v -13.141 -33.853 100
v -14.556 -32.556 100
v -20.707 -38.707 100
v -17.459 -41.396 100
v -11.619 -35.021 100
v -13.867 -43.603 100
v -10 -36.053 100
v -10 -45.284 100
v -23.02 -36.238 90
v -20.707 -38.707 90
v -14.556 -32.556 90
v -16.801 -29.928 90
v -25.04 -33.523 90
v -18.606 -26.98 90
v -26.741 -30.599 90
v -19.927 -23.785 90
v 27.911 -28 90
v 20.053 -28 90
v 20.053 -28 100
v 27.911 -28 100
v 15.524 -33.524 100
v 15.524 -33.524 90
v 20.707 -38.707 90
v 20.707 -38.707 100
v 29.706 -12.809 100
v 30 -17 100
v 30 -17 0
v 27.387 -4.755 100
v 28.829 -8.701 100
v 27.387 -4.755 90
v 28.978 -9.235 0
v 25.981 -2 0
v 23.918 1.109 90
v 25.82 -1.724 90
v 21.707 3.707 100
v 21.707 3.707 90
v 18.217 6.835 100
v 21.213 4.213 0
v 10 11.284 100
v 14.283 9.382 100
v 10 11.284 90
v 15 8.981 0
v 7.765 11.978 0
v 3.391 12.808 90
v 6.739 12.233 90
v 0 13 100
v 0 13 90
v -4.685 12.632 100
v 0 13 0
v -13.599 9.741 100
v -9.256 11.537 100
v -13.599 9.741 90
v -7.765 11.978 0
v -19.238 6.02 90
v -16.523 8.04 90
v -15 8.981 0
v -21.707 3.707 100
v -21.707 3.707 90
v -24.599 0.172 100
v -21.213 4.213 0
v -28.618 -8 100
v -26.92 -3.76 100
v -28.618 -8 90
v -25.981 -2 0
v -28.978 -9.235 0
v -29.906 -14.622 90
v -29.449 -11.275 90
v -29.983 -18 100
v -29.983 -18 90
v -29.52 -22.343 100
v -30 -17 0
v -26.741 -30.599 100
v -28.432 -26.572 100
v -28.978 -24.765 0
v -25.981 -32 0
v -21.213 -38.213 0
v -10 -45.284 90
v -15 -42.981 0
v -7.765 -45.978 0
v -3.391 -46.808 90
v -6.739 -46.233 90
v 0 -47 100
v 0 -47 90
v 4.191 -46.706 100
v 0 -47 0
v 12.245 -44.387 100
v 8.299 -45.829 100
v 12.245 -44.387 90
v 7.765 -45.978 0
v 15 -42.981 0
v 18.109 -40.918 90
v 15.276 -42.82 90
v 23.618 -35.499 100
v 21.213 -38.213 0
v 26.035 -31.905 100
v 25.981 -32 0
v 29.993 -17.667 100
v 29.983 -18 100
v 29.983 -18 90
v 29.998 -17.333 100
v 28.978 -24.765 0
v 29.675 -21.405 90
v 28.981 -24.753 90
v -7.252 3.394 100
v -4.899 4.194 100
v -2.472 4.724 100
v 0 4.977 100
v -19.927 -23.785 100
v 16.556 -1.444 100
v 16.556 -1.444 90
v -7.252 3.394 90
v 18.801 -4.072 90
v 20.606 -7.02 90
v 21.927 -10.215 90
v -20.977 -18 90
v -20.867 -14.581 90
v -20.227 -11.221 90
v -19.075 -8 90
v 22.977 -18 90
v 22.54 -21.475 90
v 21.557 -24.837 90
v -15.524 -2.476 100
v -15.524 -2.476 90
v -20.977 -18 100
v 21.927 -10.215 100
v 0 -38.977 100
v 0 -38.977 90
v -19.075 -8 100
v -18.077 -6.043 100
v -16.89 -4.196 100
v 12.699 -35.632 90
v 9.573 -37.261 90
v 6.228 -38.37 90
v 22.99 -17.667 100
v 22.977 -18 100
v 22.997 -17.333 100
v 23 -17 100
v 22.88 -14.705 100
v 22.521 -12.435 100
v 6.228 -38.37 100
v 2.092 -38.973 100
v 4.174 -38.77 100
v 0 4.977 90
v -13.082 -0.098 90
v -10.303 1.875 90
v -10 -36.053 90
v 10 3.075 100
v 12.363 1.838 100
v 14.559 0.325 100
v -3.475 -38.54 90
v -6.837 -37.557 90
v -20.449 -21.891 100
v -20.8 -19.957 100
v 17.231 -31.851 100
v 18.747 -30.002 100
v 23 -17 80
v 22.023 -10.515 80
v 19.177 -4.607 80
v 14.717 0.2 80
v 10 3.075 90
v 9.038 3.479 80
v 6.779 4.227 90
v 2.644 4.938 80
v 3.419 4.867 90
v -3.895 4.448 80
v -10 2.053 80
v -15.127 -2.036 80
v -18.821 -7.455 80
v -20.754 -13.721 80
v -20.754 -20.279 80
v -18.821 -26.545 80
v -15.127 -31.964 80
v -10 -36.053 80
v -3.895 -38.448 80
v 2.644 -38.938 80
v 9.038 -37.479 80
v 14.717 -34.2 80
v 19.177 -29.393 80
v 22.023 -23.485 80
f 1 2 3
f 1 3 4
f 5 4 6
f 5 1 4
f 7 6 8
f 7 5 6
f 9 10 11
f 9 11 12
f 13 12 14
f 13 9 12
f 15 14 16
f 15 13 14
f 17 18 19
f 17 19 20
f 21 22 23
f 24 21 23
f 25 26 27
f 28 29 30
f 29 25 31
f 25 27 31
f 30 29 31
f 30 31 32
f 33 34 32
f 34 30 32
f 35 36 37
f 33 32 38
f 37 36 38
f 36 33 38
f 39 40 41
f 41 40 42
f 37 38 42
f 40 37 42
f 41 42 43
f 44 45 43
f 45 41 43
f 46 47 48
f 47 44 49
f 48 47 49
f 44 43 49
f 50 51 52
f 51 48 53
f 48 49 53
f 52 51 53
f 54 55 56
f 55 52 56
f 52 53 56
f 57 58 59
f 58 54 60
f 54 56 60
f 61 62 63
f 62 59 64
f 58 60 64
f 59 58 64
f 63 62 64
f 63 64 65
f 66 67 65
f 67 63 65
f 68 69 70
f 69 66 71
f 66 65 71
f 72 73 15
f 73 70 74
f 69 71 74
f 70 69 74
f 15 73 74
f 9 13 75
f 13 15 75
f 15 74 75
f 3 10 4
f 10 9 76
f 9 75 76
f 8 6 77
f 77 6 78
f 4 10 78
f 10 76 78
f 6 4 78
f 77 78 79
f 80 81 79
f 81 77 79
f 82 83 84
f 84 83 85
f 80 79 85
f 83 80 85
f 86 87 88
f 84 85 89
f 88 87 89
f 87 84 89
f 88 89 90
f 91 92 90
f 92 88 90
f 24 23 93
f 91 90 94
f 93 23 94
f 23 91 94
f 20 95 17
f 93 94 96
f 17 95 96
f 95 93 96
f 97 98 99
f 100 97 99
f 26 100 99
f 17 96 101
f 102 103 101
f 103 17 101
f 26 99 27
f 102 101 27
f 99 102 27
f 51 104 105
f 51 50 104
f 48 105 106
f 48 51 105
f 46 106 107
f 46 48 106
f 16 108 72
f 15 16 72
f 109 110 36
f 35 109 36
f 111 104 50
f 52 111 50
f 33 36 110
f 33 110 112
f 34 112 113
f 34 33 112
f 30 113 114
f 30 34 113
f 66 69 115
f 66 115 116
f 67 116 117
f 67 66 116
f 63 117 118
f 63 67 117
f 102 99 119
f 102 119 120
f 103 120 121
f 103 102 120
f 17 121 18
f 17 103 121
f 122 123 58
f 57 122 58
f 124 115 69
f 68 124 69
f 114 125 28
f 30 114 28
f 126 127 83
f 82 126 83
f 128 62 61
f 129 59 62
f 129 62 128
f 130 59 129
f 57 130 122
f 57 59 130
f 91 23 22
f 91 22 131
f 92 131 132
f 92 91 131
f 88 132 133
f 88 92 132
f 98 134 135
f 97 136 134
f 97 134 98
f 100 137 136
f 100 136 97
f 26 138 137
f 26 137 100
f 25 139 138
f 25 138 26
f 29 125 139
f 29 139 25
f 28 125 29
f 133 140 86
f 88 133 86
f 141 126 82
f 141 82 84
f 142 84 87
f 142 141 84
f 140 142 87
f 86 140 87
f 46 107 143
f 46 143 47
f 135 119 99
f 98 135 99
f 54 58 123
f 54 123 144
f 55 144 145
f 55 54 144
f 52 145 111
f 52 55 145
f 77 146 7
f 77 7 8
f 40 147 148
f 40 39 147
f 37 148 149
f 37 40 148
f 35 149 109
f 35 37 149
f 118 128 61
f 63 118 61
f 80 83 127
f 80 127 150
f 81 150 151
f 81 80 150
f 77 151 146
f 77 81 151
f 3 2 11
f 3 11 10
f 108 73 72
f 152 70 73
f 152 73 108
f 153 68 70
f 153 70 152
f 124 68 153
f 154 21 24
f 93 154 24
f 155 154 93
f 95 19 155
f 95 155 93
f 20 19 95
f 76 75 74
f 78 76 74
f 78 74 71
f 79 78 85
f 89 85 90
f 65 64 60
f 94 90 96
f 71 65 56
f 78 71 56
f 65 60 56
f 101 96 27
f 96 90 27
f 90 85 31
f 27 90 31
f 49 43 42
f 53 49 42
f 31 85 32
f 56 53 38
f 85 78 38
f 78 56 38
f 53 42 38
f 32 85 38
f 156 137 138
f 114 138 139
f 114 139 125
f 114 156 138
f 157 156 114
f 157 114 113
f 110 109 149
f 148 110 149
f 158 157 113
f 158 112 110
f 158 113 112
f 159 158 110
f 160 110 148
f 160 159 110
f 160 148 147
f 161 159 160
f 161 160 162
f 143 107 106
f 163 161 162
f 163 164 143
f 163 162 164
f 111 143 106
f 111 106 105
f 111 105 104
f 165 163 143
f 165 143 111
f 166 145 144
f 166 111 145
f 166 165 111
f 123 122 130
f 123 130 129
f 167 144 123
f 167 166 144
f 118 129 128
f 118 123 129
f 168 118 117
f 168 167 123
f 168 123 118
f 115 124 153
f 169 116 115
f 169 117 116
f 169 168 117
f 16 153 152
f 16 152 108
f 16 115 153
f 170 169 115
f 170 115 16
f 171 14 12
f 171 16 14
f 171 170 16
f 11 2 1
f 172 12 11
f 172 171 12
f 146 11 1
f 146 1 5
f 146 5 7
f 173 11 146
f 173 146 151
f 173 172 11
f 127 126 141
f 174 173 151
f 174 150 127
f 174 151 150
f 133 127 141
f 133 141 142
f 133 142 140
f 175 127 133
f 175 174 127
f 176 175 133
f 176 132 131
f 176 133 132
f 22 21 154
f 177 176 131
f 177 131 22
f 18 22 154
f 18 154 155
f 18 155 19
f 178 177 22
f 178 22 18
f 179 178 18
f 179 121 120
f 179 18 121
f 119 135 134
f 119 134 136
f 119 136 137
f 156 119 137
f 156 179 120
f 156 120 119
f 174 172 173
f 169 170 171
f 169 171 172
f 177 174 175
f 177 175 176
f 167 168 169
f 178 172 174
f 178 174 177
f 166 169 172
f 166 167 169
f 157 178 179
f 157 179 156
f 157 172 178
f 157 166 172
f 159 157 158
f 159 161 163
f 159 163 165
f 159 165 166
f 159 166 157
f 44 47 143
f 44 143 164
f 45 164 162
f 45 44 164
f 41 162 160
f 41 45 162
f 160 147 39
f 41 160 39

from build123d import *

# Parameters (mm, degrees)
CYLINDER001_R     = 22
CYLINDER001_DEPTH = 20
BOX_W             = 10
BOX_H             = 25
BOX_DEPTH         = 10
ARRAY_COUNT       = 8
CYLINDER_R        = 30
CYLINDER_DEPTH    = 100


with BuildPart() as cilindre001:
    # Cylinder001 → Cylinder001 (new body)
    with BuildSketch(Plane(origin=(1, -17, 80), x_dir=(1, 0, 0), z_dir=(0, 0, 1))):
        Circle(CYLINDER001_R)
    extrude(amount=CYLINDER001_DEPTH)


with BuildPart() as array:
    # Box → Box (new body)
    with BuildSketch(Plane.XY):
        with Locations((5, 12.5)):
            Rectangle(BOX_W, BOX_H)
    extrude(amount=BOX_DEPTH)

    # Array: Array ×8 about axis
    array_axis = Axis((0, -18, 0), (0, 0, 1))


with BuildPart() as array_1:
    add(array.part)
    for i in range(1, ARRAY_COUNT):
        add(array.part.rotate(array_axis, i * 360 / ARRAY_COUNT))


with BuildPart() as array_2:
    # Array placement: moved
    add(array_1.part.moved(Location((0, 0, 90))))


with BuildPart() as cut001:
    # Cylinder → Cylinder (new body)
    with BuildSketch(Plane(origin=(0, -17, 0), x_dir=(1, 0, 0), z_dir=(0, 0, 1))):
        Circle(CYLINDER_R)
    extrude(amount=CYLINDER_DEPTH)

    # Cut: cut Array
    add(array_2.part, mode=Mode.SUBTRACT)

    # Cut001: cut Cilindre001
    add(cilindre001.part, mode=Mode.SUBTRACT)


solid = cut001.part
